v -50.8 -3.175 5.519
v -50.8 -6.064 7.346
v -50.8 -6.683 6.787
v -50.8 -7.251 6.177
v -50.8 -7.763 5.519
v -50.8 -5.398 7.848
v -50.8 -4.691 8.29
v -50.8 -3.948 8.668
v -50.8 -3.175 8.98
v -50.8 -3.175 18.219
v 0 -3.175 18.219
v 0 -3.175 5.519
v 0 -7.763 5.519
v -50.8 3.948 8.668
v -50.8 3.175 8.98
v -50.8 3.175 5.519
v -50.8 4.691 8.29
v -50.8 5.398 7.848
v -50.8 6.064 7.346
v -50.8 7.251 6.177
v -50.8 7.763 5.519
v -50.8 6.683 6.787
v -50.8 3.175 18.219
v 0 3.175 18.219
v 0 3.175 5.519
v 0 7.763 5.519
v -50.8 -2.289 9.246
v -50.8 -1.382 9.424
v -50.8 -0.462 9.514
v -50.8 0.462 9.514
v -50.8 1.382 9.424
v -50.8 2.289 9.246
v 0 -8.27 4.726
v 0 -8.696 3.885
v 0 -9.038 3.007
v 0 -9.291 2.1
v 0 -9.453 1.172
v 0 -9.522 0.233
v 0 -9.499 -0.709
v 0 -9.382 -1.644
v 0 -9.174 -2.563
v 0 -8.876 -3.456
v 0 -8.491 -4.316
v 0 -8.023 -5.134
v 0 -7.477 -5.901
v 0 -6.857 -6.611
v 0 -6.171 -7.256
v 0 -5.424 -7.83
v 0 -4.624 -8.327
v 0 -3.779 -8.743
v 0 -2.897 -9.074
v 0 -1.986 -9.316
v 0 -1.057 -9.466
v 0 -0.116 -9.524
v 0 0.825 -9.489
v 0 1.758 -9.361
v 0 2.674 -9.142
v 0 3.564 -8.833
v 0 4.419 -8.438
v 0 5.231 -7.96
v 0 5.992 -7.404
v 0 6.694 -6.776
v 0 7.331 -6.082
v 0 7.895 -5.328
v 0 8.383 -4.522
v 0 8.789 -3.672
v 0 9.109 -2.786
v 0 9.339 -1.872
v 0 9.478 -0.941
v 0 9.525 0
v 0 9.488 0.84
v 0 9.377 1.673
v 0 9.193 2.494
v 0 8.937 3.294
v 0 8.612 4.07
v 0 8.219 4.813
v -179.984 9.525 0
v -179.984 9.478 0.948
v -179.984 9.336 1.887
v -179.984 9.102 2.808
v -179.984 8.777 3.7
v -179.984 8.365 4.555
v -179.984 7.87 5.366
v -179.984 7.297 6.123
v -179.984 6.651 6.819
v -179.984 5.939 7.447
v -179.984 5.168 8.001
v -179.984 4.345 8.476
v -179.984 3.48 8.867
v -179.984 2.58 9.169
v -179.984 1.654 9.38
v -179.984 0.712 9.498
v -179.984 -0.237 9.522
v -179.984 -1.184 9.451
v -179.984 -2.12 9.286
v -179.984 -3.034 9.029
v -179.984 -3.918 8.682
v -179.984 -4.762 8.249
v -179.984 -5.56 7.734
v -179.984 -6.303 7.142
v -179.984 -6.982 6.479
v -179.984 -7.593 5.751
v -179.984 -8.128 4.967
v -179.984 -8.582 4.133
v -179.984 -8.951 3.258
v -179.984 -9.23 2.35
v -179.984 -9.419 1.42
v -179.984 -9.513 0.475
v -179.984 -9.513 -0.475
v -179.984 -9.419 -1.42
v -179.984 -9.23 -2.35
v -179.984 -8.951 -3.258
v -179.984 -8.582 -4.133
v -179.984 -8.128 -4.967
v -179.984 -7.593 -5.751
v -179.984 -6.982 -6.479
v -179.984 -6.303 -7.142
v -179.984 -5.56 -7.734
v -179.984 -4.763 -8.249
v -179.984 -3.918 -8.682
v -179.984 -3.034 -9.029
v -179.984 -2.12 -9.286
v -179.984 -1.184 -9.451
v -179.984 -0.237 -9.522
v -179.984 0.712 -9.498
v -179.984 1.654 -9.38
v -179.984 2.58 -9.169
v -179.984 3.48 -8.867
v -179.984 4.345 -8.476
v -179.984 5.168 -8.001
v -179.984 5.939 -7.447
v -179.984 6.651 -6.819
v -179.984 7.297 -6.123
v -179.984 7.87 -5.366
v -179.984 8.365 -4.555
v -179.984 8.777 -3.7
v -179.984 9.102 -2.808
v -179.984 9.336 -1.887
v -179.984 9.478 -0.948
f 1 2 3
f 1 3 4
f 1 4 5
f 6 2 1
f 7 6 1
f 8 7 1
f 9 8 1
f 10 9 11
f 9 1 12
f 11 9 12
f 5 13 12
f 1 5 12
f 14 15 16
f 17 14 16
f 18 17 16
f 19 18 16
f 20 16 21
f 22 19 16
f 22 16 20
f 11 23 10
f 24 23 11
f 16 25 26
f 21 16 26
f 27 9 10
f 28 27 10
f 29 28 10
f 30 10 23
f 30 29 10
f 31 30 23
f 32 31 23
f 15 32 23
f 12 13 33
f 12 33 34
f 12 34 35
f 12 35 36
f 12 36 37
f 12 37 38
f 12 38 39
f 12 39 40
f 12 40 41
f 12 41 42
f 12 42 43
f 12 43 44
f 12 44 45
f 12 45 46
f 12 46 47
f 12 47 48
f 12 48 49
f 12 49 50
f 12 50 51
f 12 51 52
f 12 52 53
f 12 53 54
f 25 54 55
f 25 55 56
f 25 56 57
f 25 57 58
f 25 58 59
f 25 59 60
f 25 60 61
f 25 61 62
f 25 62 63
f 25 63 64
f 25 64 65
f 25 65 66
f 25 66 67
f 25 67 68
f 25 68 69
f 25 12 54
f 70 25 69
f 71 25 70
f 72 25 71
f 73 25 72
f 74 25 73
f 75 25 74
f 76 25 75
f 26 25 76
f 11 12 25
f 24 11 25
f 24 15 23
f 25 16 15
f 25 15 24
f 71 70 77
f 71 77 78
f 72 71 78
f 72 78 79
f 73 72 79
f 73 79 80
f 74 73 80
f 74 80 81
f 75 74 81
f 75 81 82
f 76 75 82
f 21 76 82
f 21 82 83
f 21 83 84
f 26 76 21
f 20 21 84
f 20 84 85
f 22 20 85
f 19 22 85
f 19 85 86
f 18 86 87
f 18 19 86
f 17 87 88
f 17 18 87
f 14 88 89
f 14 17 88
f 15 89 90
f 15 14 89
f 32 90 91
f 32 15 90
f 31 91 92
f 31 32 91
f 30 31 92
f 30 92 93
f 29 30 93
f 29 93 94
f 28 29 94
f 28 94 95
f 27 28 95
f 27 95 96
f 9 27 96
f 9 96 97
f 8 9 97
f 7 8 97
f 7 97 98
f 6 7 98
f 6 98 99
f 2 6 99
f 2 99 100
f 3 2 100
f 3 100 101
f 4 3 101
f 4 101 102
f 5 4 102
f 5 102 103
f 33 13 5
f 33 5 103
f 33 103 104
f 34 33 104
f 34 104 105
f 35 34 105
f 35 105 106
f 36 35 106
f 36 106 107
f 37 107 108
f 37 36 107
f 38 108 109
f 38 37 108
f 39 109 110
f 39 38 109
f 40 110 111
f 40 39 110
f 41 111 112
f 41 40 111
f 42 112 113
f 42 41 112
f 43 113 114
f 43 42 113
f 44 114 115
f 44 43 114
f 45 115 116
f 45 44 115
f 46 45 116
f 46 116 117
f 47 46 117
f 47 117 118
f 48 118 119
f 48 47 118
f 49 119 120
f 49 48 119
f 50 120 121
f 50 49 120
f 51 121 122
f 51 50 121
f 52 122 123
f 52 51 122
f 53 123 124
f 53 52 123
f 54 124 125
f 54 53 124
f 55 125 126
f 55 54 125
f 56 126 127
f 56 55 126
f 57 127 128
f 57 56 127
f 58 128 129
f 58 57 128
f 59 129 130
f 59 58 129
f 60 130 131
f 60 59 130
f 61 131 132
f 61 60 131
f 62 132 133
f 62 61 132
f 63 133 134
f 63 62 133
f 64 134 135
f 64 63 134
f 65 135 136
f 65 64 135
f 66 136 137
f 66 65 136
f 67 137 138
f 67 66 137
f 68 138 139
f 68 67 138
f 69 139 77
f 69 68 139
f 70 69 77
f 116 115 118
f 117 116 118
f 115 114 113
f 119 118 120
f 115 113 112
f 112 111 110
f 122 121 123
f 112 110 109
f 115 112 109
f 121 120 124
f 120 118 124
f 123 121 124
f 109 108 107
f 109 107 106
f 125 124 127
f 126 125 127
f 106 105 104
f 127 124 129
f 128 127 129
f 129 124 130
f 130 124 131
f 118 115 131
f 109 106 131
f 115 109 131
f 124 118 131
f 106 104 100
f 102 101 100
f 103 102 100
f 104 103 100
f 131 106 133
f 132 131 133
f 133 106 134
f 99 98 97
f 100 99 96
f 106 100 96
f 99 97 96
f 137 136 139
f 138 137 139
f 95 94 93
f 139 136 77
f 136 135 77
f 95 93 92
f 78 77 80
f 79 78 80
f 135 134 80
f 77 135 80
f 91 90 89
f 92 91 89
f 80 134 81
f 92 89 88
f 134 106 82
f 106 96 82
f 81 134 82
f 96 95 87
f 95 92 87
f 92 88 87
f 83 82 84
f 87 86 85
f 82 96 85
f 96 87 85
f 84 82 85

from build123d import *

# Parameters (mm, degrees)
F0_R     = 9.525
F1_DEPTH = 179.9844
F3_DEPTH = 50.8
F4_W     = 50.8
F4_H     = 6.35
F5_DEPTH = 12.7


with BuildPart() as f1:
    # F0 (on Right) → F1 (new body)
    with BuildSketch(Plane.YZ):
        Circle(F0_R)
    extrude(amount=-F1_DEPTH)

    # F2 (on face) → F3 (cut)
    with BuildSketch(Plane.YZ):
        with BuildLine():
            Line((-7.7629294276, 5.5192890577), (0, 5.5192890577))
            Line((0, 5.5192890577), (7.7629294276, 5.5192890577))
            ThreePointArc((7.7629294276, 5.5192890577), (0, 9.525), (-7.7629294276, 5.5192890577))
        make_face()
    extrude(amount=-F3_DEPTH, mode=Mode.SUBTRACT)

    # F4 (on face) → F5 (join)
    with BuildSketch(Plane.XY.offset(5.5192890577)):
        with Locations((-25.4, 0)):
            Rectangle(F4_W, F4_H)
    extrude(amount=F5_DEPTH)


solid = f1.part
